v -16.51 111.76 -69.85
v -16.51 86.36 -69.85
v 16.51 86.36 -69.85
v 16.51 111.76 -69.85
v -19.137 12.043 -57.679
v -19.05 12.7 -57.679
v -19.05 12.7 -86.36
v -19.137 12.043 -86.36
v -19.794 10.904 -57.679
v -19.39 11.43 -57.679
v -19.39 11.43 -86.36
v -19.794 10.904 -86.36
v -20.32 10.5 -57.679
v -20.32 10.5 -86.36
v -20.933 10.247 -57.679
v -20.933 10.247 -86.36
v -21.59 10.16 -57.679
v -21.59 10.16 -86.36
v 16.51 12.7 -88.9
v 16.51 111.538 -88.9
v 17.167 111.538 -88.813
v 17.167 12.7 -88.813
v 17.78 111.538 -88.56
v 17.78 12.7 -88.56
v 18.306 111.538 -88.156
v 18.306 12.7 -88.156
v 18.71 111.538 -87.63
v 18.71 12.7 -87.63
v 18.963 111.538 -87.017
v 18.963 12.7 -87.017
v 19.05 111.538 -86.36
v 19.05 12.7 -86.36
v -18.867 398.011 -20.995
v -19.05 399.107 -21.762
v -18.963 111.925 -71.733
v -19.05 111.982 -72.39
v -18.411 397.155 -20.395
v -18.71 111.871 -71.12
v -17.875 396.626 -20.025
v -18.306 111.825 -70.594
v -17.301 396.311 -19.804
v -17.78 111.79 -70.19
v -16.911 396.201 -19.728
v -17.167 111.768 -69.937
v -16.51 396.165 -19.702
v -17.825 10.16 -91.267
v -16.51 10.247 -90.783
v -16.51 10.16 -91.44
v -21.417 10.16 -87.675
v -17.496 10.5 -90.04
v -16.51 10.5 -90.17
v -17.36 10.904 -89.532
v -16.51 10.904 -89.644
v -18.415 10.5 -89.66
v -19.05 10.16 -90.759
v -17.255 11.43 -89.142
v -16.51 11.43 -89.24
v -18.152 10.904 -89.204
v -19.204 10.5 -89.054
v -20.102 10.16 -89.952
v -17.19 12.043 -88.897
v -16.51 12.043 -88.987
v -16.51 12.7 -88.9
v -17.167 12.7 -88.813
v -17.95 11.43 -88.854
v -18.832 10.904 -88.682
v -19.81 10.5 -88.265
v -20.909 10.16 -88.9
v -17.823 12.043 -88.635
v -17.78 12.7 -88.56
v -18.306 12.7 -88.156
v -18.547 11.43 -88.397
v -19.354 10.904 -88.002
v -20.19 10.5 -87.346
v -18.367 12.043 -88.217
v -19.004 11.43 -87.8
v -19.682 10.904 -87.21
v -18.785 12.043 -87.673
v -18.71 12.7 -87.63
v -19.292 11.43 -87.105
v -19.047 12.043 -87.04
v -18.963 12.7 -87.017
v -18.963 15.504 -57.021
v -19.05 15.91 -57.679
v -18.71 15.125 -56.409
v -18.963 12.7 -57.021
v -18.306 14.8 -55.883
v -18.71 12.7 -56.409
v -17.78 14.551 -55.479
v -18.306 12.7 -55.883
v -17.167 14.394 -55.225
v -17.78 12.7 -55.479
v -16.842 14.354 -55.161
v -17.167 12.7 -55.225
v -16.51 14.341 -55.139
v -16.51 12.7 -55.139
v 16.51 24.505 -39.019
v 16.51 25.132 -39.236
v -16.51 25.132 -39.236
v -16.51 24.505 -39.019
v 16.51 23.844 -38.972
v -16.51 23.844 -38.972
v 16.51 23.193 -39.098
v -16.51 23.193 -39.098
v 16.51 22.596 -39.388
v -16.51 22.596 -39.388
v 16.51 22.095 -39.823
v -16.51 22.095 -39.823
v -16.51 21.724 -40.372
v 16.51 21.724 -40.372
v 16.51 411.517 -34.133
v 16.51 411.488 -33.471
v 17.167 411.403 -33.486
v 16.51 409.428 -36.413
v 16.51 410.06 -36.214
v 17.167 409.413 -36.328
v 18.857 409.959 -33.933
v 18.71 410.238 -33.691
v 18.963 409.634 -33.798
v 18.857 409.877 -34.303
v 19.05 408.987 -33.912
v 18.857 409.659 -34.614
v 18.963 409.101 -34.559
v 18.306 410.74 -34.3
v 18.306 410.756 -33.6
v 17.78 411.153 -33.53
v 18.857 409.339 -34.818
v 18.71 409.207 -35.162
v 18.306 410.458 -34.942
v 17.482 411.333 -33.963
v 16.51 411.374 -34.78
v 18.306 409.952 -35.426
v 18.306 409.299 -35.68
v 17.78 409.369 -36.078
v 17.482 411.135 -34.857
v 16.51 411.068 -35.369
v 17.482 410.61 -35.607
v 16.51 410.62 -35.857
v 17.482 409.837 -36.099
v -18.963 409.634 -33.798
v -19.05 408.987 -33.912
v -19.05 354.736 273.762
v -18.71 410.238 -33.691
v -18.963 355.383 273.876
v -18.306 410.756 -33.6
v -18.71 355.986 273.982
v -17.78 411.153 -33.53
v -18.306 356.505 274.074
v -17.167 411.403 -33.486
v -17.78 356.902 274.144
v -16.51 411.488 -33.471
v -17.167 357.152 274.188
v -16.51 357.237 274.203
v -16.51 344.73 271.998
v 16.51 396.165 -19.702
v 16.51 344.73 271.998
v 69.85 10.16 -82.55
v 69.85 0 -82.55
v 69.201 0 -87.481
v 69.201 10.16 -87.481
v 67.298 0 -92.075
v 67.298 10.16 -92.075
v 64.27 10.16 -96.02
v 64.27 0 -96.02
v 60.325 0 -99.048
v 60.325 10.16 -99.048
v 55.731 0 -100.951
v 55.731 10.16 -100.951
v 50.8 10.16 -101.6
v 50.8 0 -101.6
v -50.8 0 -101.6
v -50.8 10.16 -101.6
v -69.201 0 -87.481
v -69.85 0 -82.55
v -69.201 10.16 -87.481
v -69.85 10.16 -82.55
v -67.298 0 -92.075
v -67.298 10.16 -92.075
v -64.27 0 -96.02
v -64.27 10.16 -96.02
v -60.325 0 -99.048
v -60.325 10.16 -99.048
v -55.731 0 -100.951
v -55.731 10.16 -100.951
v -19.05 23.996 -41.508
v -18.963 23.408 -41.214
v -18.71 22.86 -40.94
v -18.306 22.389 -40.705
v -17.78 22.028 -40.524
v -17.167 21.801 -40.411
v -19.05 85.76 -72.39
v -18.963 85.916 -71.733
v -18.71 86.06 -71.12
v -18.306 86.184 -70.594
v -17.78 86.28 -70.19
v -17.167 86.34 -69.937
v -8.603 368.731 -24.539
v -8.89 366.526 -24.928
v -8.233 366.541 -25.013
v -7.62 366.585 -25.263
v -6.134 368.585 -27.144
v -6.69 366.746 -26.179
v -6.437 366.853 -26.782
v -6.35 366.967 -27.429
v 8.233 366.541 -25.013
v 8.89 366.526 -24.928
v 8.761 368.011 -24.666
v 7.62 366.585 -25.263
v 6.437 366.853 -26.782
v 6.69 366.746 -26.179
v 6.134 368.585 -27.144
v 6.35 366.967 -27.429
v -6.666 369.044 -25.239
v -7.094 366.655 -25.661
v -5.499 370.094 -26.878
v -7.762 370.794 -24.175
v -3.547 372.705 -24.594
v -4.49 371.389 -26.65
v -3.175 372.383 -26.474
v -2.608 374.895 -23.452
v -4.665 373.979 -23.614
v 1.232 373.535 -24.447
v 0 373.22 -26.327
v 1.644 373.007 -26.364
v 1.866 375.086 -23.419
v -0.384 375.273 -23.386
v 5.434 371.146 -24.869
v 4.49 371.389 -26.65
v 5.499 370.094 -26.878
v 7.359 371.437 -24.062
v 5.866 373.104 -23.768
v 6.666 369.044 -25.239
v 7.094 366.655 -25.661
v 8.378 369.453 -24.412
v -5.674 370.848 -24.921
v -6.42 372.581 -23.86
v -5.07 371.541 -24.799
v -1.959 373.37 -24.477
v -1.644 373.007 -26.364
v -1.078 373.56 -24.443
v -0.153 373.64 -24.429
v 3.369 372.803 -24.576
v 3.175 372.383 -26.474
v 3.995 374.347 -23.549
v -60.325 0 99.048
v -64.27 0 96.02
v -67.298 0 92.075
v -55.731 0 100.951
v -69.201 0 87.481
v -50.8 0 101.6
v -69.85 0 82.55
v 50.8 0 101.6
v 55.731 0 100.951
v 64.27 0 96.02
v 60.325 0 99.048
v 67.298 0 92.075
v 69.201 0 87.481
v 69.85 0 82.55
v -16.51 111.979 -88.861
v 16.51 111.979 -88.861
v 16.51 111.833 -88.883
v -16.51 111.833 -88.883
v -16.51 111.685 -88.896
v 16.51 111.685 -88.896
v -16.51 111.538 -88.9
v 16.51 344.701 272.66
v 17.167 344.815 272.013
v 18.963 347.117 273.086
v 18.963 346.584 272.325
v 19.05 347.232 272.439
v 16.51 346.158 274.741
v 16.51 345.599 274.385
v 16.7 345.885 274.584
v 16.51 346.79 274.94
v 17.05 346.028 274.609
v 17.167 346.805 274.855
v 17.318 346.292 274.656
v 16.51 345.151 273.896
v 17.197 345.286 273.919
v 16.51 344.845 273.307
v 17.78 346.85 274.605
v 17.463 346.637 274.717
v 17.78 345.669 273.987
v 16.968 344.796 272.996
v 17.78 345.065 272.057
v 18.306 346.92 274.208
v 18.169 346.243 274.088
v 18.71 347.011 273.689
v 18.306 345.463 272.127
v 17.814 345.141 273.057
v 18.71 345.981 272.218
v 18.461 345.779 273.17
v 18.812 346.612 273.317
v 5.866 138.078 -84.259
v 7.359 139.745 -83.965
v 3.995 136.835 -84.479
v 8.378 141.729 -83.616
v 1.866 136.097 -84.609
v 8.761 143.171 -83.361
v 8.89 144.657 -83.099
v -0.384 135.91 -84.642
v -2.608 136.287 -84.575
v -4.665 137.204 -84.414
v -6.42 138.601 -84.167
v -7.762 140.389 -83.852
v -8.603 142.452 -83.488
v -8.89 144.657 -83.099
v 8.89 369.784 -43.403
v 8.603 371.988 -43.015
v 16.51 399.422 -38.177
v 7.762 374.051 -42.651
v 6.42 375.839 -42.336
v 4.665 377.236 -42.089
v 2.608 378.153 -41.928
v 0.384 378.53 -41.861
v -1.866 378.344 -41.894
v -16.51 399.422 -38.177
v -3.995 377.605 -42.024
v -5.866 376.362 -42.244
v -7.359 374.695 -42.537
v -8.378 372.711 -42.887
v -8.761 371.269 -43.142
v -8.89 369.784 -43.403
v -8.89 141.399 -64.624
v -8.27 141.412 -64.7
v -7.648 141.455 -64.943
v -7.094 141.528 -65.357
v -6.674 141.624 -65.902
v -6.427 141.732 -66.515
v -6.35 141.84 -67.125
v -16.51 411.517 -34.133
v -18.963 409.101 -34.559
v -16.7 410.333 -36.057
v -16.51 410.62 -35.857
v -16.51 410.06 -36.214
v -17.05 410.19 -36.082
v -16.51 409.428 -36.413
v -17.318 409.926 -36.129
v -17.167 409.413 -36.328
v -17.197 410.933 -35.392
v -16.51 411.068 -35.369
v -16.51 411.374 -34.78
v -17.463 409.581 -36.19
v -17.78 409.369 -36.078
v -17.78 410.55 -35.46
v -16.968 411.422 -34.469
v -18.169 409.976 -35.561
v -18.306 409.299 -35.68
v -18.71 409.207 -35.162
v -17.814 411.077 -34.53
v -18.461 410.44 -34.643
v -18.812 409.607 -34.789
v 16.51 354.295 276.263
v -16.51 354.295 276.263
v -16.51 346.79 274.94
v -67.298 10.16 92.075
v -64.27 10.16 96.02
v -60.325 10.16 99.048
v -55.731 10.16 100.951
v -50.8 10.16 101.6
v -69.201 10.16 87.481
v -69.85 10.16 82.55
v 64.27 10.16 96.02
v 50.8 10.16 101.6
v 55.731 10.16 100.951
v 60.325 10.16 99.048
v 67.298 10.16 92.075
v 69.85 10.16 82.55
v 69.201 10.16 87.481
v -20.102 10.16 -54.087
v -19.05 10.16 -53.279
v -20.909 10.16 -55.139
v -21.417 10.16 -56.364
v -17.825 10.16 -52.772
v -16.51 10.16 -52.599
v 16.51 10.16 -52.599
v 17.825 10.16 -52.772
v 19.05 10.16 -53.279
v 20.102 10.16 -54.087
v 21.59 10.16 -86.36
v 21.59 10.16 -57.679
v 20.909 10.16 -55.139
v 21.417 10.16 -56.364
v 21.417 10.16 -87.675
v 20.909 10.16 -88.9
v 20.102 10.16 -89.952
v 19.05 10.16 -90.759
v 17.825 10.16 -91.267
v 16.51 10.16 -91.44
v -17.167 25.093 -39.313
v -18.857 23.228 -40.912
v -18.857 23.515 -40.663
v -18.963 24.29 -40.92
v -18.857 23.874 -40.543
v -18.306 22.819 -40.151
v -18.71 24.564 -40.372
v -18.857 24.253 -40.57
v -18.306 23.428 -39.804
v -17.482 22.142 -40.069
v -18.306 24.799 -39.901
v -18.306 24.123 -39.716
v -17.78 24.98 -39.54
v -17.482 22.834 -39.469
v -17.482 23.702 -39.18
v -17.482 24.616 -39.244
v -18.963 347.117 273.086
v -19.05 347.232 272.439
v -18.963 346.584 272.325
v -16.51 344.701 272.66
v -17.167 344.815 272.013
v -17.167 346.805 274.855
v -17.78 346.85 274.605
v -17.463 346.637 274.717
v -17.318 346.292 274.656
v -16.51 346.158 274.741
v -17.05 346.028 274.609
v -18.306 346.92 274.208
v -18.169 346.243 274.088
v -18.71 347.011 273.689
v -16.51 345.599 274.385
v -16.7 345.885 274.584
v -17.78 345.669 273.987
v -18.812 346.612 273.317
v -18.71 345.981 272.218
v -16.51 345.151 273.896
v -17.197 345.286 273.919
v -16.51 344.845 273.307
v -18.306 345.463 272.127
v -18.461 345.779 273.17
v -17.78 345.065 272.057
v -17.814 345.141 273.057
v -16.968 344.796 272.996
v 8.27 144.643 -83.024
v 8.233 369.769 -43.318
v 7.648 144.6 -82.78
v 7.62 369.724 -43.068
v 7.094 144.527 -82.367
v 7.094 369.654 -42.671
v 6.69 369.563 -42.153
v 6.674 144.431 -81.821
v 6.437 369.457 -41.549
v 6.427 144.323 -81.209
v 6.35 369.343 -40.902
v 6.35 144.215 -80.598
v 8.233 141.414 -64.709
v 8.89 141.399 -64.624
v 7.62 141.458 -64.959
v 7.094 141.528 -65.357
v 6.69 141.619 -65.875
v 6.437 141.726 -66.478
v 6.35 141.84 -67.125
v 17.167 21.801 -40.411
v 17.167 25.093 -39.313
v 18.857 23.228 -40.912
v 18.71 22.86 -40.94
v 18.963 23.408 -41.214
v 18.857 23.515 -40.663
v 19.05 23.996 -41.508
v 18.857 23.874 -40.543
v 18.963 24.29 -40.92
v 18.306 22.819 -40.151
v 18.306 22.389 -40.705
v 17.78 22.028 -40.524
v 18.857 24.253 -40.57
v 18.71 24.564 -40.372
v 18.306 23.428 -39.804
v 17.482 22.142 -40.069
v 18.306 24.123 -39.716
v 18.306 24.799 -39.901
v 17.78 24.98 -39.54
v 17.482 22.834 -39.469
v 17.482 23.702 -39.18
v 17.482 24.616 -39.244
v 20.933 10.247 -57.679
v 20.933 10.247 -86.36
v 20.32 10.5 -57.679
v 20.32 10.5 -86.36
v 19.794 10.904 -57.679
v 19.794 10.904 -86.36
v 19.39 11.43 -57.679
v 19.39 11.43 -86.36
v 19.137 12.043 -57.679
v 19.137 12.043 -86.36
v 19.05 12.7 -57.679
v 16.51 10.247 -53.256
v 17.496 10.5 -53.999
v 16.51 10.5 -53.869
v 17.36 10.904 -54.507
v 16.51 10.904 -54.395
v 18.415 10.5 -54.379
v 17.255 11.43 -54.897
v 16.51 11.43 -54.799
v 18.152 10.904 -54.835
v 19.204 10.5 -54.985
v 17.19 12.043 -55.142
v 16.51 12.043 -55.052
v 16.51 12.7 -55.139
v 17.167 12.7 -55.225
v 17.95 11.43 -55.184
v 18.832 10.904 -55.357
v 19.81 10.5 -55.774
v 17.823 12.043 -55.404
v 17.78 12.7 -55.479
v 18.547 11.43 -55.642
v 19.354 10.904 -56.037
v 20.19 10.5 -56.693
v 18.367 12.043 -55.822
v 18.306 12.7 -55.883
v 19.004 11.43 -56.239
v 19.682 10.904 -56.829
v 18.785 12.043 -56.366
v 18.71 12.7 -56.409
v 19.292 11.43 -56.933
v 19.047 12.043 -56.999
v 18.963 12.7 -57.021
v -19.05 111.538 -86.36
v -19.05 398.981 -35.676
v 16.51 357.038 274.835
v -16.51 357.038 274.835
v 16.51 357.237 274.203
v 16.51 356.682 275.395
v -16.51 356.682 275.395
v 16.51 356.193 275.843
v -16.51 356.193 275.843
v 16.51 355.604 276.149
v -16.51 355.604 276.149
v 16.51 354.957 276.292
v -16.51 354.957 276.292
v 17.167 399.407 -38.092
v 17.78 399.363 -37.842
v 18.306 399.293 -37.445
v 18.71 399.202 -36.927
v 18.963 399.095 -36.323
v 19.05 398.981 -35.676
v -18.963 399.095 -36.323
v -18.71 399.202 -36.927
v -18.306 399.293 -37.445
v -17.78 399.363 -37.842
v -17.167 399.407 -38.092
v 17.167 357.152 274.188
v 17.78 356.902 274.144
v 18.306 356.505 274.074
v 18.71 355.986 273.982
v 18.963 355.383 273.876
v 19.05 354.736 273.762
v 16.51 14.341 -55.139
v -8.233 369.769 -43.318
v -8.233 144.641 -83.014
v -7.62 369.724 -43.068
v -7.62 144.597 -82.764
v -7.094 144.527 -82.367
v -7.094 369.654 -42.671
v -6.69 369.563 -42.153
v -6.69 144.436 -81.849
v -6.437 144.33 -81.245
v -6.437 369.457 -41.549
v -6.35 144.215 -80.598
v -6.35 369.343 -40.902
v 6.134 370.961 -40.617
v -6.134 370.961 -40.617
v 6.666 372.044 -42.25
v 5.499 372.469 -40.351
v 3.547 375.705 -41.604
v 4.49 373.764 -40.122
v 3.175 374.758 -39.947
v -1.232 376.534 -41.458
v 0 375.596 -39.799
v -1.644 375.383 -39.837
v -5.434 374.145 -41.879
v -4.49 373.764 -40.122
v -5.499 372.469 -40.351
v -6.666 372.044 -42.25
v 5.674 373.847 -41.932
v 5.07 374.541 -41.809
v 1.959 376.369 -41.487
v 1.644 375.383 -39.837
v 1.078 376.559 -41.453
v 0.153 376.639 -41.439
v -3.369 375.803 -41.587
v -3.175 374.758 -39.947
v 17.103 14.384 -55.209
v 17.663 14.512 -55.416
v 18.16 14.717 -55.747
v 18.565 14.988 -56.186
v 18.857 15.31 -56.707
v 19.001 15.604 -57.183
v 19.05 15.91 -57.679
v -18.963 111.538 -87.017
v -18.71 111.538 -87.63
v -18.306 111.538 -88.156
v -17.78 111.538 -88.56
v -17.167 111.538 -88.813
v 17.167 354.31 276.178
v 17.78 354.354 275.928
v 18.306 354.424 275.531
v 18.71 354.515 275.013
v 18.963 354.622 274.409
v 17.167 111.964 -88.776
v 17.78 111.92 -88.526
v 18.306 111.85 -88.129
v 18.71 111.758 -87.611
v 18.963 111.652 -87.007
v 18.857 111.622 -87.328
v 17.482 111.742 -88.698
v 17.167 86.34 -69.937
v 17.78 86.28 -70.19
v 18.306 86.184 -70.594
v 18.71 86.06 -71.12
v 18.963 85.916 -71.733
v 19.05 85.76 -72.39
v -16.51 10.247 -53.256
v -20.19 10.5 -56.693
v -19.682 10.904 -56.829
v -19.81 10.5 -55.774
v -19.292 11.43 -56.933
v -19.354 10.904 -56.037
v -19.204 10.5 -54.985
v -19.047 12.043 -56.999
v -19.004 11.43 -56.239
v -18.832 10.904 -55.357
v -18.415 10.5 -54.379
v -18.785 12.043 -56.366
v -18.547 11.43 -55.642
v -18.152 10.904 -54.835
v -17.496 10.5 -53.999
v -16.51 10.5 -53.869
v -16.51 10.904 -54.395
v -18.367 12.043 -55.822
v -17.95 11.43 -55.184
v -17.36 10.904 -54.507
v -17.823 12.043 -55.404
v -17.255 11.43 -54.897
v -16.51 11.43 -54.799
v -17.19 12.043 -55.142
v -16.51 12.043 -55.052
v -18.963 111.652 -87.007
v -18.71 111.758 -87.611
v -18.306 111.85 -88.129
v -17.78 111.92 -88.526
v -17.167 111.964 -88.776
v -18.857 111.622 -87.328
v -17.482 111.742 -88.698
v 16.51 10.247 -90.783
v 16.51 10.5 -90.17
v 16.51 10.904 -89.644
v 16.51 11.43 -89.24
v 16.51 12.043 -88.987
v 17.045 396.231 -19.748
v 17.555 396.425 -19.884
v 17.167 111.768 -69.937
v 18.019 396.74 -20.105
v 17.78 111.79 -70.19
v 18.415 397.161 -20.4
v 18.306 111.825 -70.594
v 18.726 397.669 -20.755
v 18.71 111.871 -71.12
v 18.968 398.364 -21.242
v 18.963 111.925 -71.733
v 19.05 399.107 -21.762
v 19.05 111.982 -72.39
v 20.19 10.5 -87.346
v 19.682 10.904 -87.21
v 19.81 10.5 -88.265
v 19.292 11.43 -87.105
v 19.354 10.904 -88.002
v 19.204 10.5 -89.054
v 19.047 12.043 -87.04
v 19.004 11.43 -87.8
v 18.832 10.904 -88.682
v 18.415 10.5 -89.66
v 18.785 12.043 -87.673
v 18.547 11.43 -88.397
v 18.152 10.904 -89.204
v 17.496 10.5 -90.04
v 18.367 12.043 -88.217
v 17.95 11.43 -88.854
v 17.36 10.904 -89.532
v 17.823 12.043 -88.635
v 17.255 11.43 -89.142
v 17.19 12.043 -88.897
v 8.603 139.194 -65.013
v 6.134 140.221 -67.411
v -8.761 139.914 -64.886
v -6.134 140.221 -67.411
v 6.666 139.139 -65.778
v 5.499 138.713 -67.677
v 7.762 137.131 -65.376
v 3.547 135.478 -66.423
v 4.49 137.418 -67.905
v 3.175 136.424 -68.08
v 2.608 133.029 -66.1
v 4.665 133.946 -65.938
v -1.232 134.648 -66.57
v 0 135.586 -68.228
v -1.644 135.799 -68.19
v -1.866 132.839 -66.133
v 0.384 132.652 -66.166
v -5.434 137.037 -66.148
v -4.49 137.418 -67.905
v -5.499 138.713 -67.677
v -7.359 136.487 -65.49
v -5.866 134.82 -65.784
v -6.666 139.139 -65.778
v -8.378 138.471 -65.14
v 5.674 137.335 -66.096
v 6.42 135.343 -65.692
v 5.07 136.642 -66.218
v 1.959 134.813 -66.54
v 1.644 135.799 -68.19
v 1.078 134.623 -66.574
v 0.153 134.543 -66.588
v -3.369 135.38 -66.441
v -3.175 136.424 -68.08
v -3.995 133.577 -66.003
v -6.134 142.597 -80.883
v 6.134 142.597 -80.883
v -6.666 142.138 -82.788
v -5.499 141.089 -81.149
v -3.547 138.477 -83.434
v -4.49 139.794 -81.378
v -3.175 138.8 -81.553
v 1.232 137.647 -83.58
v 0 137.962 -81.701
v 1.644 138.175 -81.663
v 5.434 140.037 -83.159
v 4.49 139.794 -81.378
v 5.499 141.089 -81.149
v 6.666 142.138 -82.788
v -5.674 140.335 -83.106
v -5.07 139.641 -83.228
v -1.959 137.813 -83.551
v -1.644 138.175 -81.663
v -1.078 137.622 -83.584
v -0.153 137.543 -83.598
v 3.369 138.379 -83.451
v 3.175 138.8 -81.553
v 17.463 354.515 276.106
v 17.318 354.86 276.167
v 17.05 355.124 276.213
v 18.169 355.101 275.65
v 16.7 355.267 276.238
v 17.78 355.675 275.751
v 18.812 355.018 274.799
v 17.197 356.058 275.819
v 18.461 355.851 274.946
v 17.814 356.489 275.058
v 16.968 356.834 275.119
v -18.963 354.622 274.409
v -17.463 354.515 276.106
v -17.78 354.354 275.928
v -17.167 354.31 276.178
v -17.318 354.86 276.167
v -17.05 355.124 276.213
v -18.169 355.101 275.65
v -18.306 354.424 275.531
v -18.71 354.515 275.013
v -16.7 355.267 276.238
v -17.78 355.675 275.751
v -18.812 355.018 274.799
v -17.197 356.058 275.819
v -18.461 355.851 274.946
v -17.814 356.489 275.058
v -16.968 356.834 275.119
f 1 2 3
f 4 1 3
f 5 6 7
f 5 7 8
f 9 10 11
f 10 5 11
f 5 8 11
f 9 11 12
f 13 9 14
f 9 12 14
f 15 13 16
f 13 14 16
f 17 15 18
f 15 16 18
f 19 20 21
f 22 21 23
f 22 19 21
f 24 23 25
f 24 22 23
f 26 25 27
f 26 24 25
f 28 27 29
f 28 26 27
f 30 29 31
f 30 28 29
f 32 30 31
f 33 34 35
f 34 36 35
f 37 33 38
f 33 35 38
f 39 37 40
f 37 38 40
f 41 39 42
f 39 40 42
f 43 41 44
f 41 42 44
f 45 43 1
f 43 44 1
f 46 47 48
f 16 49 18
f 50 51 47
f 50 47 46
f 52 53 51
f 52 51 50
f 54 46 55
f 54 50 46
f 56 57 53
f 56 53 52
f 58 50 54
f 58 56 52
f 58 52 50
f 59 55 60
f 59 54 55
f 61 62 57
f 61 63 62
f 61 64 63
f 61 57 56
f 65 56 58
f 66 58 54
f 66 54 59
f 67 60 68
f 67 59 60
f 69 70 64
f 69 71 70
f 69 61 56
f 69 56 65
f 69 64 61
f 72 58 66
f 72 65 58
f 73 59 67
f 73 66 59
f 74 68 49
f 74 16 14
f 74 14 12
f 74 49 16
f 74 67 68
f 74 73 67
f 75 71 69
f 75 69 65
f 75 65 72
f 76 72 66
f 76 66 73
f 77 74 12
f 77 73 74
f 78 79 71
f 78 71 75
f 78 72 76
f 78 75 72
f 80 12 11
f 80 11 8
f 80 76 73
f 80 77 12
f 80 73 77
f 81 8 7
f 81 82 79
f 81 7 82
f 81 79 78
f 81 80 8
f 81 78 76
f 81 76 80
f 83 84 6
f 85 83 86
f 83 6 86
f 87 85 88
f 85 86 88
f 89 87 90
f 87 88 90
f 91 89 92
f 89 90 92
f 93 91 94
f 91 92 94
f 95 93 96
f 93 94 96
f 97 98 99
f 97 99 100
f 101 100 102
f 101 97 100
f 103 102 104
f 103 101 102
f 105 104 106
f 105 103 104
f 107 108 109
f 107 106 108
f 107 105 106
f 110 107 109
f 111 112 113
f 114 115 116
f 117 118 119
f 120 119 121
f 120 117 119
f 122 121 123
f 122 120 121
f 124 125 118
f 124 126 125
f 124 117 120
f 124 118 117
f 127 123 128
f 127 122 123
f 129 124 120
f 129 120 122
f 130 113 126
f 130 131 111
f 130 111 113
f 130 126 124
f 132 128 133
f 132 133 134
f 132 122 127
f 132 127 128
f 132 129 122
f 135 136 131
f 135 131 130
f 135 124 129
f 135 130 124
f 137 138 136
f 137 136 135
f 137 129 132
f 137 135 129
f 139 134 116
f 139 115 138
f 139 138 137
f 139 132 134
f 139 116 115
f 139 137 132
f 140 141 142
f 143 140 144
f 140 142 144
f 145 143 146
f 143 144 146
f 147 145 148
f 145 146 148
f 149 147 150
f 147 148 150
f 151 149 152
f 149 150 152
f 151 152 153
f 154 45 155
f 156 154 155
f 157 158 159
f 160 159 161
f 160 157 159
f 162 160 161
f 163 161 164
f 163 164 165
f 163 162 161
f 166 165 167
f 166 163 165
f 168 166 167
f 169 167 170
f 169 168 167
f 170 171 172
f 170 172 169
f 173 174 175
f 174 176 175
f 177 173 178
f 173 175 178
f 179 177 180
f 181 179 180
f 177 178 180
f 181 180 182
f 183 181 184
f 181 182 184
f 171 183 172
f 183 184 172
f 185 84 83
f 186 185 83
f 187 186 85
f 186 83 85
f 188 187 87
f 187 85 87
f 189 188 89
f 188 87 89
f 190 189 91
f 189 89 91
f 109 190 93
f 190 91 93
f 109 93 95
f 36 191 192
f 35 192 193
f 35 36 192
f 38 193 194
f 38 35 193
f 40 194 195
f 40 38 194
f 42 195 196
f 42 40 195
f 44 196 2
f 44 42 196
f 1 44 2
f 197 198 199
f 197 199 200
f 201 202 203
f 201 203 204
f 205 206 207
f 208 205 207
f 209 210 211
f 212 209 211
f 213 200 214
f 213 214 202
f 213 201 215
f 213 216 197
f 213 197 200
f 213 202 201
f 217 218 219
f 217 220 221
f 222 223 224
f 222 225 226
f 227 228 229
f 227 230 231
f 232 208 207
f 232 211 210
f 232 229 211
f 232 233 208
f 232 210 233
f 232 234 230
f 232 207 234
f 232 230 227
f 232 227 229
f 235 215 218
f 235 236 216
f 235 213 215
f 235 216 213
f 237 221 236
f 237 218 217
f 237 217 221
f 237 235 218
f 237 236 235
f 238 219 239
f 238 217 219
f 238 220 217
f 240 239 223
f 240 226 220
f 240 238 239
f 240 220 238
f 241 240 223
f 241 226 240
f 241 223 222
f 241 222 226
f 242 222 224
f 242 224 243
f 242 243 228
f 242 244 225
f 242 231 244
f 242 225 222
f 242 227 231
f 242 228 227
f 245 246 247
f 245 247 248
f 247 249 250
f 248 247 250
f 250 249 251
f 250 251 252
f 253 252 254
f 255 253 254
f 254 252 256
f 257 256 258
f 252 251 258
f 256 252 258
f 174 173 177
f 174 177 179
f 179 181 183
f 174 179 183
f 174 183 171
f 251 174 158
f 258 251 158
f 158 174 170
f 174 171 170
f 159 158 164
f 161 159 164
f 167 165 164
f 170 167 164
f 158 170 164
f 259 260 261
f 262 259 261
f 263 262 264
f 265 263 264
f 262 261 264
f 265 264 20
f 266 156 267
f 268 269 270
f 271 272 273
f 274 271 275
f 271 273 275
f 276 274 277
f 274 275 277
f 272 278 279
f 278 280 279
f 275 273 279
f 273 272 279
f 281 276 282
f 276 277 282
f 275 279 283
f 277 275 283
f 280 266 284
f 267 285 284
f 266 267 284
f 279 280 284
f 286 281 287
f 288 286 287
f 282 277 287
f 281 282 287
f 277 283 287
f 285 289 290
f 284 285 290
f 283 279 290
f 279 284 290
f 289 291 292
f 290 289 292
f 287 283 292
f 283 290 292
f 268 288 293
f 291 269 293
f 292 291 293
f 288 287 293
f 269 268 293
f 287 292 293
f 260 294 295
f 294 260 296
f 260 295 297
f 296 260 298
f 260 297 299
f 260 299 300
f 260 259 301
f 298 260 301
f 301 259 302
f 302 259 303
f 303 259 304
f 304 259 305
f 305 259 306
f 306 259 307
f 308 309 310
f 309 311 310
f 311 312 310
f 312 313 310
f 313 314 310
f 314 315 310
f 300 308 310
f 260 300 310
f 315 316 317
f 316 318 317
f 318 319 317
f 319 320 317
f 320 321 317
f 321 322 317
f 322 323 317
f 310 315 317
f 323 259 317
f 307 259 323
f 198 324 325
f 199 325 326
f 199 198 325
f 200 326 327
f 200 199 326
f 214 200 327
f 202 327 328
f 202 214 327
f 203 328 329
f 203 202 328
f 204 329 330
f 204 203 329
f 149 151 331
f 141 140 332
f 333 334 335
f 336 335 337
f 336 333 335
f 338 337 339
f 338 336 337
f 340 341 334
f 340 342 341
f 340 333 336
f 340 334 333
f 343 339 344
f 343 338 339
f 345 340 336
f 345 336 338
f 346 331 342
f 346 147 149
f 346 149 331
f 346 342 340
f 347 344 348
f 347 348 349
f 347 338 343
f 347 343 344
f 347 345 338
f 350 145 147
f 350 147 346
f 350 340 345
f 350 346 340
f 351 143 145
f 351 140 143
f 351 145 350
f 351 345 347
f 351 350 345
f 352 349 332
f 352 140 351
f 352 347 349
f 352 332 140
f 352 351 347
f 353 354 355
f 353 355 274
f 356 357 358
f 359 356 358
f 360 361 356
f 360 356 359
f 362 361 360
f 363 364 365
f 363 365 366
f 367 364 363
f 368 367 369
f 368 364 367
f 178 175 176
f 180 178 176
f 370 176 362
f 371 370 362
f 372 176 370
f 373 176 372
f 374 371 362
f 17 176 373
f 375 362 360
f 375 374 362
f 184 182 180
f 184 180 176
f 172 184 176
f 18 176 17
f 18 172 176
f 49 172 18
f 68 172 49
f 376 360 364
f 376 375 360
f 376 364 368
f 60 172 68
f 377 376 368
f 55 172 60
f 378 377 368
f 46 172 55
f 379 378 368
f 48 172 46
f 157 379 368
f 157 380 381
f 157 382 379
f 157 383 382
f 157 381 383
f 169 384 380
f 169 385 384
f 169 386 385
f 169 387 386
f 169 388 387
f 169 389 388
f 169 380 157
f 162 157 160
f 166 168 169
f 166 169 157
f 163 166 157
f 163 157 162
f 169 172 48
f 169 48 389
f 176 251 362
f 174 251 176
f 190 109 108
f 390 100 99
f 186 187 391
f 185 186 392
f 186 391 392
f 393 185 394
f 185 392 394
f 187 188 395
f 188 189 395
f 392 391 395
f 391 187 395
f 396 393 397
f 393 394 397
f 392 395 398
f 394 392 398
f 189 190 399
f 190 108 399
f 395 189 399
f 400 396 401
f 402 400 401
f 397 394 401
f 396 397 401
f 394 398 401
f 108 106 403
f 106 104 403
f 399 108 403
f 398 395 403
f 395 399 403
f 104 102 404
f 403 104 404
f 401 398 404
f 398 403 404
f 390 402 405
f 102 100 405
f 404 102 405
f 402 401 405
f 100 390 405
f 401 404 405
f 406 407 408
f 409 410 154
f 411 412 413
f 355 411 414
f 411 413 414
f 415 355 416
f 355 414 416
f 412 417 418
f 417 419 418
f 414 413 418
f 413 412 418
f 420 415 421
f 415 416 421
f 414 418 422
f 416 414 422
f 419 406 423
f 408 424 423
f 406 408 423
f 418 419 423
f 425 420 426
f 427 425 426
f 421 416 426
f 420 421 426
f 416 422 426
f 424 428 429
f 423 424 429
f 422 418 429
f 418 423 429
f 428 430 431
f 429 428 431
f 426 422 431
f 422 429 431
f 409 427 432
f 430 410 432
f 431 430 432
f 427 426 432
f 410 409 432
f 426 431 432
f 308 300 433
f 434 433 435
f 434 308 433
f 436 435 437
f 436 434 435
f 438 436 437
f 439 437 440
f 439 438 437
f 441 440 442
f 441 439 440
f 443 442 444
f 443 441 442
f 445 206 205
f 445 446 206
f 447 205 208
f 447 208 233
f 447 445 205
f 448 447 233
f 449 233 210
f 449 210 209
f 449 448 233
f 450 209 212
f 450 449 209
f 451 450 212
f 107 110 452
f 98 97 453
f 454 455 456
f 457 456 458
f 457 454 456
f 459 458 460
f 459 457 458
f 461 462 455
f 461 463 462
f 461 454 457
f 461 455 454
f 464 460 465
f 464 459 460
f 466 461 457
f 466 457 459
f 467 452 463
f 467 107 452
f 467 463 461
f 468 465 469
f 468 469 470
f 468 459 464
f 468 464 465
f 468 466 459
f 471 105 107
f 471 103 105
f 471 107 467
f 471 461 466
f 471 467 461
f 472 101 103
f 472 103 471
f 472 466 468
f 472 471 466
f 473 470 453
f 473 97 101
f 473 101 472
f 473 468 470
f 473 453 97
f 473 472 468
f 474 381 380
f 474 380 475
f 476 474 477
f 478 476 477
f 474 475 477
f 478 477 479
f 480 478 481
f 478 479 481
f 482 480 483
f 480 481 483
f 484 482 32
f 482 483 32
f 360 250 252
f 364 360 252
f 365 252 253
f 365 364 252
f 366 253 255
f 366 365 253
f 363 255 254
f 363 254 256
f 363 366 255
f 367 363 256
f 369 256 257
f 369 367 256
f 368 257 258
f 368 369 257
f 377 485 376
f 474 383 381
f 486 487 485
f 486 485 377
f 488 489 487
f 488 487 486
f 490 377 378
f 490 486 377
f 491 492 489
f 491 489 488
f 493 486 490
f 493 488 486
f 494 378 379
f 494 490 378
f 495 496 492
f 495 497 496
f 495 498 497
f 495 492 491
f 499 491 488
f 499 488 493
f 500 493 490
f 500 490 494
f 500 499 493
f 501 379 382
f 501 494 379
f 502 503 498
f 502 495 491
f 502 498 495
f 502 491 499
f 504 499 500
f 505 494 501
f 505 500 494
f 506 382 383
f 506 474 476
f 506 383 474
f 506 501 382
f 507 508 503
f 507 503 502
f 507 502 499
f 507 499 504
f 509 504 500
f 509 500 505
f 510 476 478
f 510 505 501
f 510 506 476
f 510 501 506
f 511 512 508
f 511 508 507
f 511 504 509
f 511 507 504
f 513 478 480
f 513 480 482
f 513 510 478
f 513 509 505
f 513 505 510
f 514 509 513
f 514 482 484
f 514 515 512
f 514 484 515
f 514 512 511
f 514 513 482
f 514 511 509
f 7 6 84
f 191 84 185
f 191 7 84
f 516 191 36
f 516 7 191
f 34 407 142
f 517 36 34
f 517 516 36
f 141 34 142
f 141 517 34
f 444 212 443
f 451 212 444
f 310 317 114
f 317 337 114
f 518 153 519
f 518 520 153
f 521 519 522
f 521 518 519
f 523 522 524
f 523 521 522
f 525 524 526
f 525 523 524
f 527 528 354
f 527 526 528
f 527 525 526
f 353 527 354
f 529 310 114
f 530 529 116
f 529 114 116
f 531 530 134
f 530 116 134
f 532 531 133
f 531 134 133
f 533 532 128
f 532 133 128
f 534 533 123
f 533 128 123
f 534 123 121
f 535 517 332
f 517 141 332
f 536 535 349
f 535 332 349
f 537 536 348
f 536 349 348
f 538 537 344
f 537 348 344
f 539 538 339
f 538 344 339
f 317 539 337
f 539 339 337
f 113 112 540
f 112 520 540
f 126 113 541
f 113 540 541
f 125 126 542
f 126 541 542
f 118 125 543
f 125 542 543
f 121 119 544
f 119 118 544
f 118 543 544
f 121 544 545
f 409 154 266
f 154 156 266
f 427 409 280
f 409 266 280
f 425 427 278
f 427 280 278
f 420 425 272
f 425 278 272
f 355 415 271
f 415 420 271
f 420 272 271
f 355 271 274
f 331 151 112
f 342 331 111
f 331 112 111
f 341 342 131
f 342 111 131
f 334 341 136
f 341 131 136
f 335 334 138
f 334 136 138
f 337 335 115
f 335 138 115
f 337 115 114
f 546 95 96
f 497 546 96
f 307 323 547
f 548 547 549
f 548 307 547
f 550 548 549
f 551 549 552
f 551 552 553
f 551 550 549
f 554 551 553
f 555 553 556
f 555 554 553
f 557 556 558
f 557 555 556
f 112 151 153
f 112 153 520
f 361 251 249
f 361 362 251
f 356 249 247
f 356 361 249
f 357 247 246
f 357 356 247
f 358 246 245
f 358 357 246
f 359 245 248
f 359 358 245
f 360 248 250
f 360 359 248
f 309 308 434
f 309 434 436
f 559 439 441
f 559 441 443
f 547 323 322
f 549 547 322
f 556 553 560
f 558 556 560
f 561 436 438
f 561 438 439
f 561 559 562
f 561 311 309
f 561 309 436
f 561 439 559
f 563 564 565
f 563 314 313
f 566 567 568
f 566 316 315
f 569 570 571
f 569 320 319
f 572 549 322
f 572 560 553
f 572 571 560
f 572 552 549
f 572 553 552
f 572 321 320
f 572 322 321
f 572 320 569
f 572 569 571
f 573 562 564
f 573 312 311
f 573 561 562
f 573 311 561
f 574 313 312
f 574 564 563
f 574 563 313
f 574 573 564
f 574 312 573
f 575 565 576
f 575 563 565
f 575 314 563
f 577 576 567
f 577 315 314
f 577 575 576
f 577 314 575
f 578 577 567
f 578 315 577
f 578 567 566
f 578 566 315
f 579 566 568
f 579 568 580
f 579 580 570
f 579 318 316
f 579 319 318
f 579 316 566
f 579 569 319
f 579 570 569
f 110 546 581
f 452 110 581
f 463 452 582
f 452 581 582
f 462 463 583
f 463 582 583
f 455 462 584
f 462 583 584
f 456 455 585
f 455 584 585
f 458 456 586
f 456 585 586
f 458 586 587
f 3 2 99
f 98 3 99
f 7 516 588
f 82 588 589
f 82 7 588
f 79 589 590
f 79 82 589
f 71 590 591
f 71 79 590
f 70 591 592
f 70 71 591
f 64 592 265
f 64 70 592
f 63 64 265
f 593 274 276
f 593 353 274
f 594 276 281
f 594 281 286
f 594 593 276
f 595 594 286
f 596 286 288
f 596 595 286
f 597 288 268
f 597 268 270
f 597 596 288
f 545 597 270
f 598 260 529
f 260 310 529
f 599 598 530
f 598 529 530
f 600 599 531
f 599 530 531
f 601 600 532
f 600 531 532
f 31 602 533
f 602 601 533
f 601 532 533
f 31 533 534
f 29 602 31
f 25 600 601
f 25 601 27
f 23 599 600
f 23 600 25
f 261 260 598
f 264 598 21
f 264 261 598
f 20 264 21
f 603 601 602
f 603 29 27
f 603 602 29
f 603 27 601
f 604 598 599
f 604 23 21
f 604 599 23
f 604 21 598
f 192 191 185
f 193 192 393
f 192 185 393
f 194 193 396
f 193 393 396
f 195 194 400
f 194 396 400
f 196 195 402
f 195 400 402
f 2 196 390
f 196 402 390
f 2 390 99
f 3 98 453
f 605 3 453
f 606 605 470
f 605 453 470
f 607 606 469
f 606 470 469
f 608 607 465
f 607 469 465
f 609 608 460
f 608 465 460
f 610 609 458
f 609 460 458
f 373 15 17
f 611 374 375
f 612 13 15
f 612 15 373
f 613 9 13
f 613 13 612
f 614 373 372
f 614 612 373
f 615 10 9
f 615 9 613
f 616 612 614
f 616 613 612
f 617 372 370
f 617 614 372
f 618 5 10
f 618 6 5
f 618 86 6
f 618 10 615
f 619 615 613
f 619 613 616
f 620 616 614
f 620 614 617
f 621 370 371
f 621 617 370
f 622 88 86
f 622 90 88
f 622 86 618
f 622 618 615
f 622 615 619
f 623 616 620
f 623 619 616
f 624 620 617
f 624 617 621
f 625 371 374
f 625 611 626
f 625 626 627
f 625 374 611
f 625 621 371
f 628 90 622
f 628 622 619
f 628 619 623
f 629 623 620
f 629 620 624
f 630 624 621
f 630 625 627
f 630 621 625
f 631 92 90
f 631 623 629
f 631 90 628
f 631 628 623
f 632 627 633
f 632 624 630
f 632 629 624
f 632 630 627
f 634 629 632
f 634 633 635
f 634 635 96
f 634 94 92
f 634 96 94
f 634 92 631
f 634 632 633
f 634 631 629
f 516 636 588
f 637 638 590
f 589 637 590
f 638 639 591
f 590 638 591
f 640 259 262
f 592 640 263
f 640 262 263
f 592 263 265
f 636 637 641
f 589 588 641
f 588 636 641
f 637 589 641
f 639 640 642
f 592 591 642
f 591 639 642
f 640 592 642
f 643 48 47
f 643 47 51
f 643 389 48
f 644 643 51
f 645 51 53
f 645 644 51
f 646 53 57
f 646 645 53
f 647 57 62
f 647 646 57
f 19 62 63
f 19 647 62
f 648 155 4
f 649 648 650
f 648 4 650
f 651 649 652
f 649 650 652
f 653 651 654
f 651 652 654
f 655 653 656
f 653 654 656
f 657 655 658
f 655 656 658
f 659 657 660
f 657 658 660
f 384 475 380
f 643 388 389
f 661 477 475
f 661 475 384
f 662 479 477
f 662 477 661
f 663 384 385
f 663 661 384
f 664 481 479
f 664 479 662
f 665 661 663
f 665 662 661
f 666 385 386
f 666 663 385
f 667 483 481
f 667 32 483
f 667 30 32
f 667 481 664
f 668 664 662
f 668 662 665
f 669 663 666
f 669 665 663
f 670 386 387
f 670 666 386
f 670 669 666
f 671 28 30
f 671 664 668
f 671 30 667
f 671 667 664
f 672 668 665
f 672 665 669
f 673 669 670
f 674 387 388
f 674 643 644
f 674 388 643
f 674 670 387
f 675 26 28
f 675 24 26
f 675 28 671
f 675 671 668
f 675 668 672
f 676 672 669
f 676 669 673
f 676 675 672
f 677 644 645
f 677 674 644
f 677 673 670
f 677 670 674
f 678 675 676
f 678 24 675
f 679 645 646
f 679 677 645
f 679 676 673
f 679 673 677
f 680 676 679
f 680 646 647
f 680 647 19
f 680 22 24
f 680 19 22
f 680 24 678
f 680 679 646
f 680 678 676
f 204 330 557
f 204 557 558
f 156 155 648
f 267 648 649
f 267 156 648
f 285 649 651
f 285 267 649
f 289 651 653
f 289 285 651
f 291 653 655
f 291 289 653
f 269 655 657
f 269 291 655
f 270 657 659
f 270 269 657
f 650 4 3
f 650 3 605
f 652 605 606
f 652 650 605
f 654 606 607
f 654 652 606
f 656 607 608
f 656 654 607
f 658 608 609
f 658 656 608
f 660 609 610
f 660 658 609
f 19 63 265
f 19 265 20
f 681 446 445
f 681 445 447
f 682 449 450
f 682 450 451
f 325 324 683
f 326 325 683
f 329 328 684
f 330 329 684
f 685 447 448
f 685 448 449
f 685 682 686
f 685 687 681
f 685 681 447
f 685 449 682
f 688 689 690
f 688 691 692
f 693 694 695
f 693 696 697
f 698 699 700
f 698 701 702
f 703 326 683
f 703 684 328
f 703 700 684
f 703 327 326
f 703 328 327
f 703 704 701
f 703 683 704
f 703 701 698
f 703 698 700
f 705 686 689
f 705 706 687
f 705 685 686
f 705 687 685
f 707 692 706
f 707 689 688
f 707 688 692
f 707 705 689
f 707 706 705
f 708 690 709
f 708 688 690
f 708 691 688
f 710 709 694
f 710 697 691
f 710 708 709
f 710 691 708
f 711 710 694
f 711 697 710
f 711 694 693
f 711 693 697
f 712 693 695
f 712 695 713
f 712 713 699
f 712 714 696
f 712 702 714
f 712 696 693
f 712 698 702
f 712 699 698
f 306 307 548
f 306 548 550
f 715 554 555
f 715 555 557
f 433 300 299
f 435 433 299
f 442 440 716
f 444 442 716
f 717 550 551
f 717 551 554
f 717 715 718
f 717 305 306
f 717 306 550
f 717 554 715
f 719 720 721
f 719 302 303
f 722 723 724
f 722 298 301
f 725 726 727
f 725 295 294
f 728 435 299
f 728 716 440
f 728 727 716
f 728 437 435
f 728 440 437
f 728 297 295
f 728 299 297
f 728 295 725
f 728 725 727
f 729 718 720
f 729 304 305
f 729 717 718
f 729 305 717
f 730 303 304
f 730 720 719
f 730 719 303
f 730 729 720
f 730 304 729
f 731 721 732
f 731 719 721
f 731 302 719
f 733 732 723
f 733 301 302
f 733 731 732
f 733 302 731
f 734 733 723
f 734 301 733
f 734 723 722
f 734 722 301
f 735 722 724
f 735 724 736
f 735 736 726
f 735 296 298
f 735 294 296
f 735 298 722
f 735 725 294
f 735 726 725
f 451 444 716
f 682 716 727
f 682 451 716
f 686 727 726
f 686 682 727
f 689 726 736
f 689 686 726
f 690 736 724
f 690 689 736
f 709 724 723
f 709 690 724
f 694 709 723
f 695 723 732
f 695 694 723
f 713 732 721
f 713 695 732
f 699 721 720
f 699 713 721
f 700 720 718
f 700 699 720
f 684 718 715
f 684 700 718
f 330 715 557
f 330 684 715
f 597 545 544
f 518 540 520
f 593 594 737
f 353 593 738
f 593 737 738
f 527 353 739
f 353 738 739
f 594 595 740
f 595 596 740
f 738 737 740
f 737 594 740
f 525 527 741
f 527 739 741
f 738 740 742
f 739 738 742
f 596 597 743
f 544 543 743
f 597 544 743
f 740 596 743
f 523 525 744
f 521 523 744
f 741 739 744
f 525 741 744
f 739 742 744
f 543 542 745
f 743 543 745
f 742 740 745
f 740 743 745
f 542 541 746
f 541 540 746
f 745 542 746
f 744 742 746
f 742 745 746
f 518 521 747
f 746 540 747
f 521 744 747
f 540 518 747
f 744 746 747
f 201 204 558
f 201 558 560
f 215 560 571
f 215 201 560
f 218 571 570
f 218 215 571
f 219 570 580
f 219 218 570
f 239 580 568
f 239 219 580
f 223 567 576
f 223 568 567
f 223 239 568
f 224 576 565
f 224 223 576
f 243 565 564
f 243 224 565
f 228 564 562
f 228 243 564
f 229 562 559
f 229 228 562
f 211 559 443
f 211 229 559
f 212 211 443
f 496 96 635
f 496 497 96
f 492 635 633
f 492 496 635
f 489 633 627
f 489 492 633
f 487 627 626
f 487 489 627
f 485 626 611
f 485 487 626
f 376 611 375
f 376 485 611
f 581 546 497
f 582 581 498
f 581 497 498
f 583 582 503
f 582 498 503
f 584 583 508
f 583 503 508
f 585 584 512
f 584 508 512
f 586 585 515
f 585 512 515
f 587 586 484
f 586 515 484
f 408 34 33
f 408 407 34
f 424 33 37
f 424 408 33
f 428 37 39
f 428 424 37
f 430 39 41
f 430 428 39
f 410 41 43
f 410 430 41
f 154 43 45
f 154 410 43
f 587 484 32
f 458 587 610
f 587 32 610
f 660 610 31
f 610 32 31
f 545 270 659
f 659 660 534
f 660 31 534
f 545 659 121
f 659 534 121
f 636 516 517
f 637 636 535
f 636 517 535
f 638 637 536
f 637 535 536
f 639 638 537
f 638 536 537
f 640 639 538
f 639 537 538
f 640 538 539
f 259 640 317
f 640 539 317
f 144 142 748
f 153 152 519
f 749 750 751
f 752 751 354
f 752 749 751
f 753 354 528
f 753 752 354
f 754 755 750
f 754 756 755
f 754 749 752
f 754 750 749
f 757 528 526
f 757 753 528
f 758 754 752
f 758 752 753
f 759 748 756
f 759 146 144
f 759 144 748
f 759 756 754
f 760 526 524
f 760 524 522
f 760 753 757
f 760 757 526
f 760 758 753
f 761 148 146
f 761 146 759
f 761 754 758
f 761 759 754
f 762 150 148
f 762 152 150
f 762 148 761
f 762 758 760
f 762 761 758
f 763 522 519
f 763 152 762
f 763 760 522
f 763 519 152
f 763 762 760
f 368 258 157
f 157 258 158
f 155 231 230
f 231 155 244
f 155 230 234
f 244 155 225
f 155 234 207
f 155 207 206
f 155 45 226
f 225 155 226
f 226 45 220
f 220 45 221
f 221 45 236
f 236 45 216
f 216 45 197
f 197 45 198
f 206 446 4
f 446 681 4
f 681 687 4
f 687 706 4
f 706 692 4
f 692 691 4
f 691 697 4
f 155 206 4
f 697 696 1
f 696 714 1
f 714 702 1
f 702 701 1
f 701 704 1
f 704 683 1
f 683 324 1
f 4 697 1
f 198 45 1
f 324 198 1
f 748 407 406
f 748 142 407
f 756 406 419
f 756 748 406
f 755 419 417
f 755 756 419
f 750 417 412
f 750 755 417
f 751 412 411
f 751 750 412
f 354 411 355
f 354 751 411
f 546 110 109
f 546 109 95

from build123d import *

# Parameters (mm, degrees)
SKETCH1_W           = 139.7
SKETCH1_H           = 203.2
BOSS_EXTRUDE1_DEPTH = 10.16
SKETCH2_W           = 38.1
SKETCH2_H           = 50.8
BOSS_EXTRUDE2_DEPTH = 76.2
CUT_EXTRUDE1_DEPTH  = 89.9
SKETCH4_W           = 38.1
SKETCH4_H           = 19.05
BOSS_EXTRUDE3_DEPTH = 25.4
BOSS_EXTRUDE4_DEPTH = 38.1
CUT_EXTRUDE2_DEPTH  = 82.219688091
SKETCH7_W           = 38.1
SKETCH7_H           = 12.7
BOSS_EXTRUDE5_DEPTH = 317.5
FILLET1_R           = 2.54
FILLET2_R           = 19.05


with BuildPart() as part:
    # Sketch1 → Boss-Extrude1 (new body)
    with BuildSketch(Plane(origin=(0, 0, 0), x_dir=(1, 0, 0), z_dir=(0, 1, 0))):
        Rectangle(SKETCH1_W, SKETCH1_H)
    extrude(amount=BOSS_EXTRUDE1_DEPTH)

    # Sketch2 → Boss-Extrude2 (add)
    with BuildSketch(Plane(origin=(0, 10.16, 0), x_dir=(1, 0, 0), z_dir=(0, 1, 0))):
        with Locations((0, 63.5)):
            Rectangle(SKETCH2_W, SKETCH2_H)
    extrude(amount=BOSS_EXTRUDE2_DEPTH)

    # Sketch3 → Cut-Extrude1 (cut, through all)
    with BuildSketch(Plane.ZY.offset(19.05)):
        Polygon((-38.1, 10.16), (-38.1, 22.86), (-55.138837989, 14.340581006), (-55.138837989, 10.16), align=None)
        Polygon((-38.1, 86.36), (-69.85, 86.36), (-38.1, 22.86), align=None)
    extrude(amount=-CUT_EXTRUDE1_DEPTH, mode=Mode.SUBTRACT)

    # Sketch4 → Boss-Extrude3 (add)
    with BuildSketch(Plane(origin=(0, 86.36, 0), x_dir=(1, 0, 0), z_dir=(0, 1, 0))):
        with Locations((0, 79.375)):
            Rectangle(SKETCH4_W, SKETCH4_H)
    extrude(amount=BOSS_EXTRUDE3_DEPTH)

    # Sketch5 → Boss-Extrude4 (add)
    with BuildSketch(Plane.ZY.offset(19.05)):
        Polygon((-88.9, 111.76), (-38.177367303, 399.422344655), (-19.701795091, 396.16460279), (-69.85, 111.76), align=None)
    extrude(amount=-BOSS_EXTRUDE4_DEPTH)

    # Sketch6 → Cut-Extrude2 (cut, through all)
    with BuildSketch(Plane(origin=(0, 15.315029856, -86.85585039), x_dir=(1, 0, 0), z_dir=(0, -0.173648178, 0.984807753))):
        with BuildLine():
            Line((6.35, 356.628790374), (6.35, 128.028790374))
            ThreePointArc((6.35, 128.028790374), (0, 121.678790374), (-6.35, 128.028790374))
            Line((-6.35, 128.028790374), (-6.35, 356.628790374))
            ThreePointArc((-6.35, 356.628790374), (0, 362.978790374), (6.35, 356.628790374))
        make_face()
    extrude(amount=-CUT_EXTRUDE2_DEPTH, mode=Mode.SUBTRACT)

    # Sketch7 → Boss-Extrude5 (add)
    with BuildSketch(Plane(origin=(0, 18.572771721, -105.331422603), x_dir=(1, 0, 0), z_dir=(0, -0.173648178, 0.984807753))):
        with Locations((0, 393.074791482)):
            Rectangle(SKETCH7_W, SKETCH7_H)
    extrude(amount=BOSS_EXTRUDE5_DEPTH)

    # Fillet1
    fillet1_edges = [part.edges().sort_by_distance(p)[0] for p in [
        (-19.05, 384.362754913, 120.366195344),
        (-19.05, 370.226825518, 127.398649594),
        (19.05, 370.226825518, 127.398649594),
        (0, 411.929403118, -35.972035447),
        (19.05, 384.362754913, 120.366195344),
        (-19.05, 350.542577477, 275.601760206),
        (0, 344.289048246, 274.499094278),
        (19.05, 350.542577477, 275.601760206),
        (0, 356.796106709, 276.704426134),
        (0, 10.16, -88.9),
        (19.05, 60.96, -88.9),
        (-19.05, 10.16, -72.019418994),
        (-19.05, 60.96, -88.9),
        (0, 22.86, -38.1),
        (19.05, 10.16, -72.019418994),
        (19.05, 12.250290503, -55.138837989),
        (0, 10.16, -55.138837989),
        (19.05, 18.600290503, -46.619418994),
        (-19.05, 18.600290503, -46.619418994),
        (-19.05, 12.250290503, -55.138837989),
        (19.05, 54.61, -53.975),
        (-19.05, 54.61, -53.975),
        (-19.05, 99.06, -69.85),
        (19.05, 99.06, -69.85),
        (0, 111.76, -88.9),
        (-19.05, 253.962301395, -44.775897545),
        (-19.05, 261.844701559, -62.436017724),
        (19.05, 261.844701559, -62.436017724),
        (19.05, 253.962301395, -44.775897545),
        (0, 376.037098661, -42.300817123),
        (6.35, 257.22004326, -63.251469758),
        (0, 138.402987859, -84.202122394),
        (-6.35, 257.22004326, -63.251469758),
        (0, 372.779356796, -23.82524491),
        (-6.35, 253.962301395, -44.775897545),
        (0, 135.145245994, -65.726550181),
        (6.35, 253.962301395, -44.775897545),
    ]]
    fillet(fillet1_edges, radius=FILLET1_R)

    # Fillet2
    fillet2_edges = [part.edges().sort_by_distance(p)[0] for p in [
        (69.85, 5.08, 101.6),
        (-69.85, 5.08, 101.6),
        (-69.85, 5.08, -101.6),
        (69.85, 5.08, -101.6),
    ]]
    fillet(fillet2_edges, radius=FILLET2_R)


solid = part.part
